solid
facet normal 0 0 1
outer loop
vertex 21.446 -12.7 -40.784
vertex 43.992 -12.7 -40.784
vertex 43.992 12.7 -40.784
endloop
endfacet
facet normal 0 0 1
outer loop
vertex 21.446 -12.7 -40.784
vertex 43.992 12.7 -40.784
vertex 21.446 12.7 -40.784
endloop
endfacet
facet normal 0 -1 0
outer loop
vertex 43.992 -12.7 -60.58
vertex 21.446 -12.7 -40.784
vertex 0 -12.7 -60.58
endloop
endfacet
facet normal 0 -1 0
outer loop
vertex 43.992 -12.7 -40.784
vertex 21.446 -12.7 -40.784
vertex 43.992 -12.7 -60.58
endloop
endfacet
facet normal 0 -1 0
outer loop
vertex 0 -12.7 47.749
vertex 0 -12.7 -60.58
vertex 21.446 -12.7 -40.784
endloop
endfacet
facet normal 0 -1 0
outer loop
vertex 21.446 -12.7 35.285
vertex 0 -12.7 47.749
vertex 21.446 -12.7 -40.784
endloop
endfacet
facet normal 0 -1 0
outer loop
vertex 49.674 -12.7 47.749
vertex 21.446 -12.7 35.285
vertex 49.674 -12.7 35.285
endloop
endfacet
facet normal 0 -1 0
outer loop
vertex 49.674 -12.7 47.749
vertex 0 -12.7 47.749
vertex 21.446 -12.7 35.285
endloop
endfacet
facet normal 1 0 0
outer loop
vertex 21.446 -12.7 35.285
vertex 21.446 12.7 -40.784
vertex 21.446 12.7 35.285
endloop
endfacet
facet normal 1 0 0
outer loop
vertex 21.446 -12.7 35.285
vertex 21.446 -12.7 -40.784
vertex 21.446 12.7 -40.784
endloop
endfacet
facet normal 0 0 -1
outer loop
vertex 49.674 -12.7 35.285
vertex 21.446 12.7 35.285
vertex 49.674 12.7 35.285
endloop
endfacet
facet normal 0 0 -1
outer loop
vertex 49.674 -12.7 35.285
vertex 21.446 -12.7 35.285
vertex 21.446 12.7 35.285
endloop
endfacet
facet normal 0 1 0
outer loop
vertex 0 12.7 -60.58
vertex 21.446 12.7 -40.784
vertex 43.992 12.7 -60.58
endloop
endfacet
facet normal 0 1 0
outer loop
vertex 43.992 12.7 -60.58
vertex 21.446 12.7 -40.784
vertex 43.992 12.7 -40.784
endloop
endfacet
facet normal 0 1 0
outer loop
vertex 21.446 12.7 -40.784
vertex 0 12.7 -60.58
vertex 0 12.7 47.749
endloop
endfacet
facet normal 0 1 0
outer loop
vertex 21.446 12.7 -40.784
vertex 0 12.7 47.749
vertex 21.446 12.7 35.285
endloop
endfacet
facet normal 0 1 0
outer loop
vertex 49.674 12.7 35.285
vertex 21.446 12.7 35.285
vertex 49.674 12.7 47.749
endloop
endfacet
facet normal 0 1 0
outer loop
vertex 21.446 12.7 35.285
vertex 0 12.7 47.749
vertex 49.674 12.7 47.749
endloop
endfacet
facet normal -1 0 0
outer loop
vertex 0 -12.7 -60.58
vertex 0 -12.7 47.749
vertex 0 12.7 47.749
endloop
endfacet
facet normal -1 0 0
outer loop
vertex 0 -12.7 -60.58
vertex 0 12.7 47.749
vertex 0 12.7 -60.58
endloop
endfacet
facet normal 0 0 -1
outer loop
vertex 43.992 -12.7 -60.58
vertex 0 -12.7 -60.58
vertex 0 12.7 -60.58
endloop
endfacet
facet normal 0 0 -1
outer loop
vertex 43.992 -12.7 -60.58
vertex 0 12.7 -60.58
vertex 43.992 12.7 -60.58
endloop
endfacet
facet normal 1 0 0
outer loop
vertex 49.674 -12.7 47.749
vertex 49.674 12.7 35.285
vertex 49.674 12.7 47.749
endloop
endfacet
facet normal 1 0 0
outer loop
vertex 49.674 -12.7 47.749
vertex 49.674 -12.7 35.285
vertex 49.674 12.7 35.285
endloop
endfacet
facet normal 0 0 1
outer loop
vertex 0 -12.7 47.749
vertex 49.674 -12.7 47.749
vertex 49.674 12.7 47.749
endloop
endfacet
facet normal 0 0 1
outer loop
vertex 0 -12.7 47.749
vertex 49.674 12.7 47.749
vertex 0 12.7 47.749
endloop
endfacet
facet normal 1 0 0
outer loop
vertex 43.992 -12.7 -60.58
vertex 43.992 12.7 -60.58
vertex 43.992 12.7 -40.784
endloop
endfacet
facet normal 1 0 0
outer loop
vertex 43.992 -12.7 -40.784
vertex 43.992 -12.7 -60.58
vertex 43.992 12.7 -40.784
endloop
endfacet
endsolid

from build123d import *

# Parameters (mm, degrees)
F0_W     = 21.445978
F0_H     = 76.069072
F1_DEPTH = 12.7


with BuildPart() as f1:
    # F0 (on Front) → F1 (new body, symmetric)
    with BuildSketch(Plane.XZ):
        Polygon((21.445978, 35.285052), (49.674021, 35.285052), (49.674021, 47.749385), (0, 47.749385), (0, 35.285052), align=None)
        with Locations((10.722989, -2.749484)):
            Rectangle(F0_W, F0_H)
        Polygon((43.991752, -40.78402), (21.445978, -40.78402), (0, -40.78402), (0, -60.580309), (43.991752, -60.580309), align=None)
    extrude(amount=F1_DEPTH, both=True)


solid = f1.part
